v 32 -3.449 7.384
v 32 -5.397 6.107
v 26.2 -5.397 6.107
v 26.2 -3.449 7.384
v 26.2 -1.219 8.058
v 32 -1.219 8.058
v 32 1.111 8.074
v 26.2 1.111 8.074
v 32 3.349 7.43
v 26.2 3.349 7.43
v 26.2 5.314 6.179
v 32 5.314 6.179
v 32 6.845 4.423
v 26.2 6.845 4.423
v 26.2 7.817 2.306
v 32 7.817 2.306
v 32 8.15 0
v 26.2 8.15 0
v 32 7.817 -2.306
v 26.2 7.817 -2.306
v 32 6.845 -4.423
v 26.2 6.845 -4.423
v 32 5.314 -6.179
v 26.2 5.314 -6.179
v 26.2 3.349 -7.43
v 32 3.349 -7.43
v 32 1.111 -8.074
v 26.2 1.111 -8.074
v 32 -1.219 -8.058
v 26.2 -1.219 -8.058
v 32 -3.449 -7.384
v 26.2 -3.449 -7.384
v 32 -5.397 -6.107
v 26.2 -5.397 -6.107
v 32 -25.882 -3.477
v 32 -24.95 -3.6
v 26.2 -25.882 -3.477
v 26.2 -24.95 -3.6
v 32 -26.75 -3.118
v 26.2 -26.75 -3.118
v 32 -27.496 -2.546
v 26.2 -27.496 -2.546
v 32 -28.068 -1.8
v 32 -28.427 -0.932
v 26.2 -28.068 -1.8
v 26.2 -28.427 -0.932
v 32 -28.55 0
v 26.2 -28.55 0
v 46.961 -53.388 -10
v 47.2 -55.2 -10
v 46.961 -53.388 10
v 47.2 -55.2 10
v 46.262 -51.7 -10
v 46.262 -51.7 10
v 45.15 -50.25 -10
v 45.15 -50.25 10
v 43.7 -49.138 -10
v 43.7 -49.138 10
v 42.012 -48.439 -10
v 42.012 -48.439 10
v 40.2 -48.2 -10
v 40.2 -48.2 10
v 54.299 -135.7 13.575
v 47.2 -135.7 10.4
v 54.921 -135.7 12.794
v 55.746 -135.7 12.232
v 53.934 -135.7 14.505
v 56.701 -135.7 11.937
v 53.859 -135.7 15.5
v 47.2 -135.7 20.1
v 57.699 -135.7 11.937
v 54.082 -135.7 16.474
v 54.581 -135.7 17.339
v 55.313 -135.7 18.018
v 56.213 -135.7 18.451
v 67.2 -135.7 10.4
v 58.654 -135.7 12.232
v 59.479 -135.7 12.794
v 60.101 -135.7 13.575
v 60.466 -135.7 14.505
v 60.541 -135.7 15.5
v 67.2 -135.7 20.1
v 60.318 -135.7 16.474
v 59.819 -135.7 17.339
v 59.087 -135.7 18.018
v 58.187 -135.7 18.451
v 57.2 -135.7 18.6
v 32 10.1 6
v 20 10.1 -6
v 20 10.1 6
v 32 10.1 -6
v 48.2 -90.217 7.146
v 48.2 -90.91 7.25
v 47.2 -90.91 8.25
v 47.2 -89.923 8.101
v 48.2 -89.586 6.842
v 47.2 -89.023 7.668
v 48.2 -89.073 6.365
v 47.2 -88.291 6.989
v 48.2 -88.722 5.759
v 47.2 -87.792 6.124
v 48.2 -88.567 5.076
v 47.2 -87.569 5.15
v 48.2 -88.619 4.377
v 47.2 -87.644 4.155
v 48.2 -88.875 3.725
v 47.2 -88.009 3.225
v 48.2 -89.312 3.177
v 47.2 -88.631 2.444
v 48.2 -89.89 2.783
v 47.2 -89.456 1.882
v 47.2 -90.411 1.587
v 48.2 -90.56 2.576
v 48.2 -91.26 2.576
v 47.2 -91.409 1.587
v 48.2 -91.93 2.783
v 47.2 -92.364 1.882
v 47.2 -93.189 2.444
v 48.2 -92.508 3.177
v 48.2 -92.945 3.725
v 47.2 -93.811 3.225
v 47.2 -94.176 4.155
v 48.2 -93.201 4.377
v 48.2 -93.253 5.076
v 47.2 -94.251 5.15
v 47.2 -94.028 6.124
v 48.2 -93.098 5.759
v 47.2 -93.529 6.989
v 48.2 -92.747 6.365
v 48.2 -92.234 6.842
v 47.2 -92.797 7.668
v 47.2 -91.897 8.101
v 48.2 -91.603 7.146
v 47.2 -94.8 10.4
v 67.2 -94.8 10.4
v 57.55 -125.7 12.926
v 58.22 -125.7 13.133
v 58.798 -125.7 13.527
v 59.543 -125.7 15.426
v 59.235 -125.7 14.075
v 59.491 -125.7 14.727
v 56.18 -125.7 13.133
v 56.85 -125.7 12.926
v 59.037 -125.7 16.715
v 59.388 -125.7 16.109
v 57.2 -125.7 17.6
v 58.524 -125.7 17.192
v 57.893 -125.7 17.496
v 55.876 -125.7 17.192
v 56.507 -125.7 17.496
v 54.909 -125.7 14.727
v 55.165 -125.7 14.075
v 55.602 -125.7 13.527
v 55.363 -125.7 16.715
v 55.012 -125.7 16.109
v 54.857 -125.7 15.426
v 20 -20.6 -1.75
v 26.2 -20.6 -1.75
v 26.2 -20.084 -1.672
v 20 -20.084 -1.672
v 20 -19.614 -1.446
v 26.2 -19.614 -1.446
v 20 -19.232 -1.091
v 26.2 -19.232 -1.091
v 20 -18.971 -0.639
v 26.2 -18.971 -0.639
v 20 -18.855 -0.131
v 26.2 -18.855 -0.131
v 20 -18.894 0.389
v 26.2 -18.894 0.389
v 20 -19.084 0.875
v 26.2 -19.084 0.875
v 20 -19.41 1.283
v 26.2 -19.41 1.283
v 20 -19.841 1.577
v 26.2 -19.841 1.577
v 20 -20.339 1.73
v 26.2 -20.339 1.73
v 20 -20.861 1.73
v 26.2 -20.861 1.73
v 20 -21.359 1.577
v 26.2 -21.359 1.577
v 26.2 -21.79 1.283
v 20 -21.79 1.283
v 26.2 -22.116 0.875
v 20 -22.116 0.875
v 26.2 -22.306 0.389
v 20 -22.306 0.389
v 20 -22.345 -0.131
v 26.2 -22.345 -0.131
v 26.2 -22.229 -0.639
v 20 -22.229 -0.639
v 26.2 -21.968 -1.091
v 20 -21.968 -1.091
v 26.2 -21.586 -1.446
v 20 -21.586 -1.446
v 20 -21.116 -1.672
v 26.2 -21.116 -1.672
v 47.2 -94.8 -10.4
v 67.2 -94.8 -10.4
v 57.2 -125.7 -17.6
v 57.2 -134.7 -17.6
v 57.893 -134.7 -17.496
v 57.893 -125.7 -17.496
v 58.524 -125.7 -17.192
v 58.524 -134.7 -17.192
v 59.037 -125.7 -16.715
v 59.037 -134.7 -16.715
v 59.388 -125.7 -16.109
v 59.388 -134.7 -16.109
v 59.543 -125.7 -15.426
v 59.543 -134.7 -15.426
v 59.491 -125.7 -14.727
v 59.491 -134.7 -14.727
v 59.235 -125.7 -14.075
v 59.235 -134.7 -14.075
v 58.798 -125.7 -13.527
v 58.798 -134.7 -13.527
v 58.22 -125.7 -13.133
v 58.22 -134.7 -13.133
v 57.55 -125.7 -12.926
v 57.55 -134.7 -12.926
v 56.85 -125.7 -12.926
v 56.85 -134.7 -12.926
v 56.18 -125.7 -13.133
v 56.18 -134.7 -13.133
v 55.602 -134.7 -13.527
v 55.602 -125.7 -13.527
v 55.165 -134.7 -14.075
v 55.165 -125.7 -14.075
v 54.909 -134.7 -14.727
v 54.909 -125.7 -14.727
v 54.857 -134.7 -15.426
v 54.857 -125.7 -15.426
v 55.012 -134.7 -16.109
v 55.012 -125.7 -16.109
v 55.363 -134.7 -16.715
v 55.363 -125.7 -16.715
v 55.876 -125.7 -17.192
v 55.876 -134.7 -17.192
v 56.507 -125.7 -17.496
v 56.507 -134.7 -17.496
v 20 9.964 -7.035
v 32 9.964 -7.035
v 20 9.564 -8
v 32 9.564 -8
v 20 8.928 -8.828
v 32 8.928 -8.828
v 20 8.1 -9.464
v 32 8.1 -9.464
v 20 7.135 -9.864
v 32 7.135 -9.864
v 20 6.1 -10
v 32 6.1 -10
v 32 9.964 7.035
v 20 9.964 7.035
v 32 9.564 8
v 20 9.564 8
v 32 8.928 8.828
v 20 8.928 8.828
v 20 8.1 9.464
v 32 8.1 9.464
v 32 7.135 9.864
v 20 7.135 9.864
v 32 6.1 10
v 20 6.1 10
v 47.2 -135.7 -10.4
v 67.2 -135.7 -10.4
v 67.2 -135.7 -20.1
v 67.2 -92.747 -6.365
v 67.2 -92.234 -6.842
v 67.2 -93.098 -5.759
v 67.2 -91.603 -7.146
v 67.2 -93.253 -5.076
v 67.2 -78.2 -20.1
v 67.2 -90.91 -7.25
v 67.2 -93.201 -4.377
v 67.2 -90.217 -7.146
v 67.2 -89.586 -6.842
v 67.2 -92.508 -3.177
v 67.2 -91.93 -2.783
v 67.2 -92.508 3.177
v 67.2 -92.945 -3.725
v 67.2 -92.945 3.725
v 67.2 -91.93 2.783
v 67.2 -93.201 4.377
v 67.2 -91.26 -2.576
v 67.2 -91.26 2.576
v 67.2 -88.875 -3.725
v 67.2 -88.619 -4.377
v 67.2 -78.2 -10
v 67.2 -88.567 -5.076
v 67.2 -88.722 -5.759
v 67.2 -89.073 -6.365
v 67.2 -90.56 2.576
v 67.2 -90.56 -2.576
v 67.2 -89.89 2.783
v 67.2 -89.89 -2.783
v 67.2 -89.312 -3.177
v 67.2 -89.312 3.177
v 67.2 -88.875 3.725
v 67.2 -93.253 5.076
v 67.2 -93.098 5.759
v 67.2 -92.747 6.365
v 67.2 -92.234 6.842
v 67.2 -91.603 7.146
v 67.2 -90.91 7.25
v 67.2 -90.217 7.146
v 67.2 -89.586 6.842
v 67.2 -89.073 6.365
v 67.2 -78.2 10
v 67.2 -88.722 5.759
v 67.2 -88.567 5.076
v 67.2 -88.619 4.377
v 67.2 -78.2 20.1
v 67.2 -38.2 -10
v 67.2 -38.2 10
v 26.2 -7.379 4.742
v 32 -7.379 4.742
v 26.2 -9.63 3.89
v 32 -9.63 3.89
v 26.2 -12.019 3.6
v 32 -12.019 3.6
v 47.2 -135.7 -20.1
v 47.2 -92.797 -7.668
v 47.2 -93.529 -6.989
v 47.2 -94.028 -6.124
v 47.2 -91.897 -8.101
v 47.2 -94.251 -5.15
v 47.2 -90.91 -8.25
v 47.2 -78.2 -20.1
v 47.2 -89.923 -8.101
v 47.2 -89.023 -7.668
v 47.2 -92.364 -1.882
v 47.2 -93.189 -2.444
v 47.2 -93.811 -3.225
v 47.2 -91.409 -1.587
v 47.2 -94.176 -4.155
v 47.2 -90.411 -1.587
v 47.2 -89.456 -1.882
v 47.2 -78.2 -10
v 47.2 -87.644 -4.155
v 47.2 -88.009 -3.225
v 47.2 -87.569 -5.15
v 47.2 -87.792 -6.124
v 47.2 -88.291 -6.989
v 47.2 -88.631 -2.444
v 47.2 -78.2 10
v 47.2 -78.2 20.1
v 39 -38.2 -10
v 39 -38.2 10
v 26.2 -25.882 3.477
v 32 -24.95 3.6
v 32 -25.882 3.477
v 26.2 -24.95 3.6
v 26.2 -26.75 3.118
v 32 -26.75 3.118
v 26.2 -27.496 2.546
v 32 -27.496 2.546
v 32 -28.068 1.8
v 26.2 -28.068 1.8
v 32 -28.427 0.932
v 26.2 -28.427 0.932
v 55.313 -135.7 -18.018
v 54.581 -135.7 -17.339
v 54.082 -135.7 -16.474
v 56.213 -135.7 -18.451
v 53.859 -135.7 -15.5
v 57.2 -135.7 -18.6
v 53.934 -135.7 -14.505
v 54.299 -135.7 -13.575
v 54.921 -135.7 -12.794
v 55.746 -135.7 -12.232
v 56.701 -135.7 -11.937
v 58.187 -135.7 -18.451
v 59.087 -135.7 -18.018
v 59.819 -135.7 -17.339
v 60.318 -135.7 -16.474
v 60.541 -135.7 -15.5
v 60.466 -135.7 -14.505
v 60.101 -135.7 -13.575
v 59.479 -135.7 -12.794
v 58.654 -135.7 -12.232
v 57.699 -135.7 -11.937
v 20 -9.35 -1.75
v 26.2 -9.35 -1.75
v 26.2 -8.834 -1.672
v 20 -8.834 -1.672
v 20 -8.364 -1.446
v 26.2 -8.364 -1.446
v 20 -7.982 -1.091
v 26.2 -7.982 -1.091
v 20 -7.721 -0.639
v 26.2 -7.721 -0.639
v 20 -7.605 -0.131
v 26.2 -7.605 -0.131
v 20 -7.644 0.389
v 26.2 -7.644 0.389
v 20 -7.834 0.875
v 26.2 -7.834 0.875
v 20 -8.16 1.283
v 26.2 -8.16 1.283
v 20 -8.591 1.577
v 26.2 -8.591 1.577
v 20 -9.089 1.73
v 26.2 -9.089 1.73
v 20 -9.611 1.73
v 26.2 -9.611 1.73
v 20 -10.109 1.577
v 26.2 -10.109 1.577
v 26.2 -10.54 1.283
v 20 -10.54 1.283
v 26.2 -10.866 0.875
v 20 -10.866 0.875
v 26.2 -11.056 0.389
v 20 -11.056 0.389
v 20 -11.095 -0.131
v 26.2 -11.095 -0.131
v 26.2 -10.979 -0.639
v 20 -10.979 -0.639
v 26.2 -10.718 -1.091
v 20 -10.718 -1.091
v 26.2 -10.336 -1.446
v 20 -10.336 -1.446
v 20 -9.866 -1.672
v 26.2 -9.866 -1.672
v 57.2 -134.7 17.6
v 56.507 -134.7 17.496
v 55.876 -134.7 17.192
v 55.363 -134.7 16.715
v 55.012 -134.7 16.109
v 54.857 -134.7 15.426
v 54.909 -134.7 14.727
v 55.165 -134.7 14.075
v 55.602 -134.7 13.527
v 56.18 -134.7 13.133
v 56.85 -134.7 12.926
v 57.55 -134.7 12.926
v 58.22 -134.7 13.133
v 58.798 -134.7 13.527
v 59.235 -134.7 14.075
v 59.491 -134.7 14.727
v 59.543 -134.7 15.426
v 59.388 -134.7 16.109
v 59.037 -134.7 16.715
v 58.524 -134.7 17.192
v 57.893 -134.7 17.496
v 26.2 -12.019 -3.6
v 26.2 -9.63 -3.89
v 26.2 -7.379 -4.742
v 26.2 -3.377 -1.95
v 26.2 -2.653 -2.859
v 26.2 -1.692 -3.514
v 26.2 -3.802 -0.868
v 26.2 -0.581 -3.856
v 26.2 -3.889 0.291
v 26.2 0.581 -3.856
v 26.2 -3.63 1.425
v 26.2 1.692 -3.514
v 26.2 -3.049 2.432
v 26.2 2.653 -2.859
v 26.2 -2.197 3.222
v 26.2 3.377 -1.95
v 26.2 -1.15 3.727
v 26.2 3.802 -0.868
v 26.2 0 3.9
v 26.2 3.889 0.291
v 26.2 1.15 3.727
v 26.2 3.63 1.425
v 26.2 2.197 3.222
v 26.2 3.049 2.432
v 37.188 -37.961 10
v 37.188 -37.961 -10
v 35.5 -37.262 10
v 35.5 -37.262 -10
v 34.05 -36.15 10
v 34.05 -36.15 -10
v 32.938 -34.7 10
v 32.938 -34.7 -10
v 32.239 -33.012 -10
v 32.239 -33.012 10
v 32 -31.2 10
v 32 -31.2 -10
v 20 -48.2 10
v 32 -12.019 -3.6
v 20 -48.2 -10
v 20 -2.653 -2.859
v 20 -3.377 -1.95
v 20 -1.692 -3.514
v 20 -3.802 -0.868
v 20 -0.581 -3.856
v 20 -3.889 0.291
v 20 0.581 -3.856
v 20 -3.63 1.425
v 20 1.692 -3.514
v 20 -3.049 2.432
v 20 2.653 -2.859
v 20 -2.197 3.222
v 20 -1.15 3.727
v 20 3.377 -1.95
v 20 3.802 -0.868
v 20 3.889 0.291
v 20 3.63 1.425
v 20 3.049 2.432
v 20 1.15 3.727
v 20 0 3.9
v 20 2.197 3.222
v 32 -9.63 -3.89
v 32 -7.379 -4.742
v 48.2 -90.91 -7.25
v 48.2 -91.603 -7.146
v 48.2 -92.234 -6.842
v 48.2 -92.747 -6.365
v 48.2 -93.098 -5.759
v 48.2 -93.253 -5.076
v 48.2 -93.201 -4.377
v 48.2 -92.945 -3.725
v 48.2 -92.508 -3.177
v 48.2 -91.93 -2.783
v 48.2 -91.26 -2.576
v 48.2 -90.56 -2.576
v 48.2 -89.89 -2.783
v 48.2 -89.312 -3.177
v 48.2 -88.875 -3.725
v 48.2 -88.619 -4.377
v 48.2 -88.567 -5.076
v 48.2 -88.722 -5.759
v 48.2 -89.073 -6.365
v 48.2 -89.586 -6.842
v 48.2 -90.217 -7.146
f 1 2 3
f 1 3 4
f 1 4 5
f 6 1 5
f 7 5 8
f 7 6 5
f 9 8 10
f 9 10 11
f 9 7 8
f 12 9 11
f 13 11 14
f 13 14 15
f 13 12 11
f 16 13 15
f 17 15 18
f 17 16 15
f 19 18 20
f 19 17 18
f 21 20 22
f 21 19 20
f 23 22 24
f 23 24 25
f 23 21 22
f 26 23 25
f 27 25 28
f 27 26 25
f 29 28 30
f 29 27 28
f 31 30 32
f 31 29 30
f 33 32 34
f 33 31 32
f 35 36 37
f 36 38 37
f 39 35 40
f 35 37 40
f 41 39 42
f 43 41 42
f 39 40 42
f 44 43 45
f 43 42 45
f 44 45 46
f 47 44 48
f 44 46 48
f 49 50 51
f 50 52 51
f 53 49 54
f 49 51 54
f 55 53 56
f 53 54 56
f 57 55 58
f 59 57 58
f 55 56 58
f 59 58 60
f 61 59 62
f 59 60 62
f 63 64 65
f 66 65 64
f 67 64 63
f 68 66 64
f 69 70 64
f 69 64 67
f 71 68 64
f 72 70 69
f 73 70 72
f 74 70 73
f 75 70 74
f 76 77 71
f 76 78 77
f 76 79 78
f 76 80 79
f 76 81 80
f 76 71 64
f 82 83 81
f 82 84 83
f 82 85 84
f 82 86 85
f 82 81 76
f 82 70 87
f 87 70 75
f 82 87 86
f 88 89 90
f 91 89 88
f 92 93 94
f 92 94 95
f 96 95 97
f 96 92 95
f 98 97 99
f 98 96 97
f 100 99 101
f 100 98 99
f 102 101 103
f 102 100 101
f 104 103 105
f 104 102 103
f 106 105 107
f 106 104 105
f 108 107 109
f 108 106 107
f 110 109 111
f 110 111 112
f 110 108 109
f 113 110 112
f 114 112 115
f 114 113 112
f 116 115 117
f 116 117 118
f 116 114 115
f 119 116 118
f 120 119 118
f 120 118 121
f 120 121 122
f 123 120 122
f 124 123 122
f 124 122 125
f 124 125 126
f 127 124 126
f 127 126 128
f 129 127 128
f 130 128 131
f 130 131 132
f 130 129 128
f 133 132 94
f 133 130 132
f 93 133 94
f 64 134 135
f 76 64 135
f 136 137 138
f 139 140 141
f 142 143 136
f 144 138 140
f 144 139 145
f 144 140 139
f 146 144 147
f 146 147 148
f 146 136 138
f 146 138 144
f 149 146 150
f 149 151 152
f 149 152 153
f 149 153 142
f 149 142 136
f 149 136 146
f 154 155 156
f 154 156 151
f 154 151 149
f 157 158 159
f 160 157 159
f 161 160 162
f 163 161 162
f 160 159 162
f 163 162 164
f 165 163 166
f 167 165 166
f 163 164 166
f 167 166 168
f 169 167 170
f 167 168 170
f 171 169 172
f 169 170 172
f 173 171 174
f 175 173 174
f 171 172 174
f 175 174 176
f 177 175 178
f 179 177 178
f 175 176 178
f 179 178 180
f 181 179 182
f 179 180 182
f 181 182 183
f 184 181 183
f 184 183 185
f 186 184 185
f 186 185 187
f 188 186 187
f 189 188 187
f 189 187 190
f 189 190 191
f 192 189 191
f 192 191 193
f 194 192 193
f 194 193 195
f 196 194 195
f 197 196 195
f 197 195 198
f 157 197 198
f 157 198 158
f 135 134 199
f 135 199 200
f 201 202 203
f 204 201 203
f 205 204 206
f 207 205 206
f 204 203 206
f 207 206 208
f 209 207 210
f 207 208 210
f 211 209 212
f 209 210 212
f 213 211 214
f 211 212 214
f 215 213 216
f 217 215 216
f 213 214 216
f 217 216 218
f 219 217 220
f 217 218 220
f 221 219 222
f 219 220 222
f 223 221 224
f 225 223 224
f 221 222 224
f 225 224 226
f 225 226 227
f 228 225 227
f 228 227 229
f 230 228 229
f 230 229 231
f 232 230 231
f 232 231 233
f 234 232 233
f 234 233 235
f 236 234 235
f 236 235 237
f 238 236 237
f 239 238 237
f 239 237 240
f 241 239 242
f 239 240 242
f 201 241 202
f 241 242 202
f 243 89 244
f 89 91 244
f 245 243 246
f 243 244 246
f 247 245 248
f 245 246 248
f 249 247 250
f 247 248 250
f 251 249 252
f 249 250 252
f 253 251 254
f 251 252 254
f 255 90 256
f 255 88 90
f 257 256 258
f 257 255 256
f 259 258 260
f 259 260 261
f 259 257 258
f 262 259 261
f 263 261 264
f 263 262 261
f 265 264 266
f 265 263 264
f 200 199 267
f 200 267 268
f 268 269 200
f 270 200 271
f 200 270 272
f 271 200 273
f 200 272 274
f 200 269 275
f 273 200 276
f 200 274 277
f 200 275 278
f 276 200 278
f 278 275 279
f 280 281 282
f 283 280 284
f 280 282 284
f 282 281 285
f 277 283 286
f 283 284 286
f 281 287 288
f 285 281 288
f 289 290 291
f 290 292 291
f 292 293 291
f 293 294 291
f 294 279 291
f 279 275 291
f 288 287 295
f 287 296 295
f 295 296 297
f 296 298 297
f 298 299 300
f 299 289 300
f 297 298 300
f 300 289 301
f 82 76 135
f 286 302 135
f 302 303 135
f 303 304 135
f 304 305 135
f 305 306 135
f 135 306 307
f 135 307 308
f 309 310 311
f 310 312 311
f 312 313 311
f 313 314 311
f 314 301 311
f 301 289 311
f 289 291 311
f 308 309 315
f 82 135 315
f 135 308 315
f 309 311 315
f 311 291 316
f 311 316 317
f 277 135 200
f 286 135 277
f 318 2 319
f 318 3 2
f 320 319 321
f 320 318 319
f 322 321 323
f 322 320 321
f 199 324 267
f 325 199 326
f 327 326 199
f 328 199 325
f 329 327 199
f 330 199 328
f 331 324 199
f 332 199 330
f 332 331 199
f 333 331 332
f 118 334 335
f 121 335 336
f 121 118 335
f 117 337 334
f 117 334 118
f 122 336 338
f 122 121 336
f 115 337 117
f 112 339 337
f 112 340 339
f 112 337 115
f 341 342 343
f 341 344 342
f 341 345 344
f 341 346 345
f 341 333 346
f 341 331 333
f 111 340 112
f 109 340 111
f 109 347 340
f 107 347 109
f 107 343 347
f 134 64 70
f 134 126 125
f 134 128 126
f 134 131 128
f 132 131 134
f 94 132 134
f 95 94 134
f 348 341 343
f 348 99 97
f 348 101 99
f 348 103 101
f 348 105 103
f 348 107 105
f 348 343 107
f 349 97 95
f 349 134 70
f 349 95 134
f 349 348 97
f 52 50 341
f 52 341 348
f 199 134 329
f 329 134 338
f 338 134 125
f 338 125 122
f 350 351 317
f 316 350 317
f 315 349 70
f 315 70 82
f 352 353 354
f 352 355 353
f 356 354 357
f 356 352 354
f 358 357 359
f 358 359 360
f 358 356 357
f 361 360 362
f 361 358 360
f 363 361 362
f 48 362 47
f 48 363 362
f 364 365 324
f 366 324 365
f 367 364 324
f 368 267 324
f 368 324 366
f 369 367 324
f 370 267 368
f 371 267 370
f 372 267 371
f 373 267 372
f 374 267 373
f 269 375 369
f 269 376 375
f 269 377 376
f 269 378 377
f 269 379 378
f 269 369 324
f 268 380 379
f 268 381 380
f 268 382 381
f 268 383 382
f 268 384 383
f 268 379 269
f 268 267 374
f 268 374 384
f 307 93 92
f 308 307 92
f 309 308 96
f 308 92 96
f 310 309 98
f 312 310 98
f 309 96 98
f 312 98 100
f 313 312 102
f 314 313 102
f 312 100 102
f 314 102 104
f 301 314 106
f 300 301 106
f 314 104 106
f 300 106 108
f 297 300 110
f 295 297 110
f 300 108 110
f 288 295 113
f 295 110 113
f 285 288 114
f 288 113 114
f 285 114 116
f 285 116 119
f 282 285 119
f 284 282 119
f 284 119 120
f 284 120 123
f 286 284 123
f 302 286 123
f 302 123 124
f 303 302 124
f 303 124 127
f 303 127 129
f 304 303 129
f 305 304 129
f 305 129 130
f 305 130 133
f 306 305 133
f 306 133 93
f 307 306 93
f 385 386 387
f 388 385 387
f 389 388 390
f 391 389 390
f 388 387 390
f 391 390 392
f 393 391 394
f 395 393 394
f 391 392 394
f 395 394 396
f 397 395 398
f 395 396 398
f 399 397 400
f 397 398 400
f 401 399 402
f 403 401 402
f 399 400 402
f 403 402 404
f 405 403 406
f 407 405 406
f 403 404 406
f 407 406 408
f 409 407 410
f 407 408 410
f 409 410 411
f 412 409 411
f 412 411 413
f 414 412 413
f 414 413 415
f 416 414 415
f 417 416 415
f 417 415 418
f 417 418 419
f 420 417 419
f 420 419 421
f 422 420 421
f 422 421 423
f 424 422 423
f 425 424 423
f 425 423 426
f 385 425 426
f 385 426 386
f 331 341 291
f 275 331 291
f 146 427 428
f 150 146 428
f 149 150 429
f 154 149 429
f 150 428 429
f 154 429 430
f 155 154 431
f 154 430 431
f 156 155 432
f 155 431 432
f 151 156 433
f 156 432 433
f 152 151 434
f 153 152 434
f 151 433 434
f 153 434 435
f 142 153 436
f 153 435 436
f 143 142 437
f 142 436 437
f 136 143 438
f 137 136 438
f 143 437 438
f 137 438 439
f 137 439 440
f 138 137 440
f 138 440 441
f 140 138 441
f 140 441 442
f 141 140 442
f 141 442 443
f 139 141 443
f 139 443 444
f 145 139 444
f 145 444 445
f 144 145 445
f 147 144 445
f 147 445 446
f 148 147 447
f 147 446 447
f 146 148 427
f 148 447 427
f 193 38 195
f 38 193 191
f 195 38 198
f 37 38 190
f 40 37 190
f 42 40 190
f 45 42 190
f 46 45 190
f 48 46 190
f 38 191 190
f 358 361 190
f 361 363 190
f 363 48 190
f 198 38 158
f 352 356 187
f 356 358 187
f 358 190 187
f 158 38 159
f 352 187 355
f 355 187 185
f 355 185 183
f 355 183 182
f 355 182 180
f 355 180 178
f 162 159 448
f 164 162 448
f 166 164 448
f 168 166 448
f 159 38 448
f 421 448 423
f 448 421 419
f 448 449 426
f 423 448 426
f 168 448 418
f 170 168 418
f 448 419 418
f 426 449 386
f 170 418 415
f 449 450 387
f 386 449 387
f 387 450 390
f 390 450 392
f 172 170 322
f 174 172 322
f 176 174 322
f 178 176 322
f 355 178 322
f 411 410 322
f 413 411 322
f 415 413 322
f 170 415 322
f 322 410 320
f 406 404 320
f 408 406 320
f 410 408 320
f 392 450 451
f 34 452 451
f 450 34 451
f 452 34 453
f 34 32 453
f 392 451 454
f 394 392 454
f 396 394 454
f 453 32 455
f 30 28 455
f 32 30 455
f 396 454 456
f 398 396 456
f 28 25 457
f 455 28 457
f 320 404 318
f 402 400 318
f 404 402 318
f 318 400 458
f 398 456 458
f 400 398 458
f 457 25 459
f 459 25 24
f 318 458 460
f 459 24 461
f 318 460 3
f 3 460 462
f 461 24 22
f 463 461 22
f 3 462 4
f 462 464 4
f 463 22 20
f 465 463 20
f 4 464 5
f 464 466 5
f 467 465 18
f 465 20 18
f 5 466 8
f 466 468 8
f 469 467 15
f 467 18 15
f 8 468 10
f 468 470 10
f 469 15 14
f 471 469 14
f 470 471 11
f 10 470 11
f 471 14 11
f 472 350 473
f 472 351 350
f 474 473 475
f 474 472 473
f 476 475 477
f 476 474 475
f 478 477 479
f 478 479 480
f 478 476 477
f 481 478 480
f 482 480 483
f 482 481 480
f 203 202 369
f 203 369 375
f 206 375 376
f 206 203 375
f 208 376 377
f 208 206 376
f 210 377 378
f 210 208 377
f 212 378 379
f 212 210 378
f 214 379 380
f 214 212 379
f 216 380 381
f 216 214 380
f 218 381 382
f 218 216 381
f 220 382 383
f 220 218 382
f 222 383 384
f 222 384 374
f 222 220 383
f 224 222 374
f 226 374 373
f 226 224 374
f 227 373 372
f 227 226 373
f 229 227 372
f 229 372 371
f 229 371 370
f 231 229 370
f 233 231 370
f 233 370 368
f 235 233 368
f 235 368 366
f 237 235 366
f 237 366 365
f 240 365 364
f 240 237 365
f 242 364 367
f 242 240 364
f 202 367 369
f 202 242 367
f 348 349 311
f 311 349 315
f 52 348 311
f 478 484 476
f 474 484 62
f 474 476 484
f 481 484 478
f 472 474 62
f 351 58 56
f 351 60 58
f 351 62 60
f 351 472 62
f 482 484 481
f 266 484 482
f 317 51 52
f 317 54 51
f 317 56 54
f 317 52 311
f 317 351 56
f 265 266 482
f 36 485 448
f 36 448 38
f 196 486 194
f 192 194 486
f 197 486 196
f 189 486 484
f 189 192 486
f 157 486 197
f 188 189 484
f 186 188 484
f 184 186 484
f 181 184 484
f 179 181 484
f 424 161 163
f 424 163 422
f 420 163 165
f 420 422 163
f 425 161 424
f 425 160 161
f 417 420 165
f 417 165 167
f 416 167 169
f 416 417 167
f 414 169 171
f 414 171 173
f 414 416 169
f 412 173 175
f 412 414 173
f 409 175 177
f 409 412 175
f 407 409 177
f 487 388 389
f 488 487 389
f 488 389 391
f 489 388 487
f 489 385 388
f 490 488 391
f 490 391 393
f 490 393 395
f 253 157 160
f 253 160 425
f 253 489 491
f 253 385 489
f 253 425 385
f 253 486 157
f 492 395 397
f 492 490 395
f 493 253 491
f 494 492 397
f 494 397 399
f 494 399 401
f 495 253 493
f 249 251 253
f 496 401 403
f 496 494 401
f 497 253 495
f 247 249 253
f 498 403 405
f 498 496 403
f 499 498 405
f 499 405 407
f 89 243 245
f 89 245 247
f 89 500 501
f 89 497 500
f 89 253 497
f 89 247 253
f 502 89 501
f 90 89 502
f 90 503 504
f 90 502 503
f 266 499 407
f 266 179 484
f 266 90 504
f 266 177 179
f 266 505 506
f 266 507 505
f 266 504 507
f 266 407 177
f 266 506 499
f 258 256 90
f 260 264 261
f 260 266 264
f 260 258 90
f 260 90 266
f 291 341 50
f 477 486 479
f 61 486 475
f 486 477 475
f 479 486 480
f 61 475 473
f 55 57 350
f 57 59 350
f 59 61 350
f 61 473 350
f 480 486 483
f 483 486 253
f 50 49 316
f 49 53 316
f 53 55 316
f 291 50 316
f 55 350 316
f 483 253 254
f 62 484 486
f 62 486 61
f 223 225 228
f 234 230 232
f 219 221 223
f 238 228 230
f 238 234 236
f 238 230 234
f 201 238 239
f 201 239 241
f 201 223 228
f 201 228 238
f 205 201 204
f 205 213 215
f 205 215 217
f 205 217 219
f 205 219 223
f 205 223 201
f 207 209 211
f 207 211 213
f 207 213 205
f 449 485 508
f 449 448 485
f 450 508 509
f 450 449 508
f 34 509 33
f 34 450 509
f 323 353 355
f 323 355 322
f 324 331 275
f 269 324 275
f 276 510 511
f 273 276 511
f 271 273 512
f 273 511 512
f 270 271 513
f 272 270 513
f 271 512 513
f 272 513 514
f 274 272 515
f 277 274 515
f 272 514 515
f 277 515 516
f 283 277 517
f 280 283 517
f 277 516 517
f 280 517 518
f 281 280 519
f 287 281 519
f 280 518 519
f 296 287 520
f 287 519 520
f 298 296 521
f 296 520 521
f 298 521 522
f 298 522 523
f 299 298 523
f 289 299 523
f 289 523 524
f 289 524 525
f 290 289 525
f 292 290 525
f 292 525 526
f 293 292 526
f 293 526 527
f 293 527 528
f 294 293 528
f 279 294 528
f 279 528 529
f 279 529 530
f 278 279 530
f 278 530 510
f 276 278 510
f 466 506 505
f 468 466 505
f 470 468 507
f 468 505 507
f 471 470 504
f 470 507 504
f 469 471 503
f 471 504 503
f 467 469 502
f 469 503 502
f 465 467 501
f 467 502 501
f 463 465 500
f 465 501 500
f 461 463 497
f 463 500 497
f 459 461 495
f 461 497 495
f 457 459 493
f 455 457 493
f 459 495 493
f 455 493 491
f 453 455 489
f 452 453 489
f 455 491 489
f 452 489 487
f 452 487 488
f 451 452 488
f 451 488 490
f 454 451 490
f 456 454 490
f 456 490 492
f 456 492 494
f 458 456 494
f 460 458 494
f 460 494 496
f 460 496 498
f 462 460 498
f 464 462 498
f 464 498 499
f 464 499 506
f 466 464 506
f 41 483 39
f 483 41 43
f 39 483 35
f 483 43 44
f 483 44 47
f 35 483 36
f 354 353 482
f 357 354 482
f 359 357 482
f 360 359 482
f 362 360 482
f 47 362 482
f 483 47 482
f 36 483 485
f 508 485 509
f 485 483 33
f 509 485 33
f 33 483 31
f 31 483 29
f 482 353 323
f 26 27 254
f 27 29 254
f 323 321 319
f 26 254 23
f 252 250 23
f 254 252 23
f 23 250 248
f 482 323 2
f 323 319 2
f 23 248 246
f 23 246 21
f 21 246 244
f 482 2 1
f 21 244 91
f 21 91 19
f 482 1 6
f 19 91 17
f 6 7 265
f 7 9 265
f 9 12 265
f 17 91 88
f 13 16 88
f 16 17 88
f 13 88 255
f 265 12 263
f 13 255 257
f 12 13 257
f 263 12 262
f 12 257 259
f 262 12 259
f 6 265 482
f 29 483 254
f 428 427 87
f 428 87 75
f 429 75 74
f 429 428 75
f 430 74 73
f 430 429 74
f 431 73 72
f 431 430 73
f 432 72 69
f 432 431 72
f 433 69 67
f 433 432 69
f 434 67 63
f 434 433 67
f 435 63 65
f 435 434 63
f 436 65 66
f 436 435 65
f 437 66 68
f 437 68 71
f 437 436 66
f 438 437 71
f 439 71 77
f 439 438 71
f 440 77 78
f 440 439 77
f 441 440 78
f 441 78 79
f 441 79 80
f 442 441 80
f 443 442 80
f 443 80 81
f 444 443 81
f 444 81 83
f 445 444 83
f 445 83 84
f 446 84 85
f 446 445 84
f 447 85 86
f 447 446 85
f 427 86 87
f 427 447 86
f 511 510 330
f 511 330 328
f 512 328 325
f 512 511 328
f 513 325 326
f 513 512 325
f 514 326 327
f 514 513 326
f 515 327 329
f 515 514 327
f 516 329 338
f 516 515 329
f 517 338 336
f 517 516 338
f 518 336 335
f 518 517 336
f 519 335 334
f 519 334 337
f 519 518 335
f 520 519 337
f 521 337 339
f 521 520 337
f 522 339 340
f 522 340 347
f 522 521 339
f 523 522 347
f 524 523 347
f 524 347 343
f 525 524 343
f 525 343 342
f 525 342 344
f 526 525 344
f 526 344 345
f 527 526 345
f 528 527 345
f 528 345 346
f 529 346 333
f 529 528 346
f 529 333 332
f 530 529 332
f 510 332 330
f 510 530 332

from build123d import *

# Parameters (mm, degrees)
SKETCH1_W            = 20
SKETCH1_H            = 20
BOSS_EXTRUDE1_DEPTH  = 20
SKETCH2_W            = 45
SKETCH2_H            = 70
BOSS_EXTRUDE2_DEPTH  = 12
CUT_EXTRUDE1_DEPTH   = 5.8
FILLET1_R            = 3.6
FILLET2_R            = 10
SKETCH5_R            = 3.9
CUT_EXTRUDE2_DEPTH   = 53.490475326
CUT_EXTRUDE3_REACH   = 51.17
SKETCH6_R            = 1.75
SKETCH7_W            = 12
SKETCH7_H            = 45
CUT_EXTRUDE4_DEPTH   = 4.8
SKETCH9_W            = 12
SKETCH9_H            = 45
CUT_EXTRUDE5_DEPTH   = 23.8
SKETCH10_W           = 12.5
SKETCH10_H           = 41.4
CUT_EXTRUDE6_DEPTH   = 23.8
SKETCH11_W           = 20
SKETCH11_H           = 1.2
CUT_EXTRUDE7_DEPTH   = 23.8
BOSS_EXTRUDE3_START  = 20
SKETCH12_W           = 20
SKETCH12_H           = 20
SKETCH12_R           = 3.9
BOSS_EXTRUDE3_DEPTH  = 20
SKETCH13_W           = 20.2
SKETCH13_H           = 20.2
SKETCH13_R           = 3.9
BOSS_EXTRUDE4_DEPTH  = 40
SKETCH14_W           = 12
SKETCH14_H           = 20
BOSS_EXTRUDE5_DEPTH  = 0.1
SKETCH17_R           = 4.83091966
BOSS_EXTRUDE8_DEPTH  = 39
SKETCH18_W           = 20.2
SKETCH18_H           = 20.2
CUT_EXTRUDE8_DEPTH   = 40
FILLET4_R            = 4
SKETCH20_W           = 12
SKETCH20_H           = 20
BOSS_EXTRUDE9_DEPTH  = 8
SKETCH21_W           = 47.2
SKETCH21_H           = 20
BOSS_EXTRUDE11_DEPTH = 10
SKETCH23_W           = 20
SKETCH23_H           = 20
BOSS_EXTRUDE12_DEPTH = 30
SKETCH25_W           = 20
SKETCH25_H           = 40.2
BOSS_EXTRUDE13_DEPTH = 57.5
SKETCH26_W           = 20
SKETCH26_H           = 20.8
CUT_EXTRUDE9_DEPTH   = 40.9
SKETCH27_R           = 2.35
CUT_EXTRUDE10_DEPTH  = 10
SKETCH28_R           = 2.35
CUT_EXTRUDE11_DEPTH  = 140.85113514
CHAMFER1_SIZE        = 1
FILLET5_R            = 7


with BuildPart() as part:
    # Sketch1 → Boss-Extrude1 (new body)
    with BuildSketch(Plane(origin=(0, 0, 0), x_dir=(0, 0, -1), z_dir=(1, 0, 0))):
        Rectangle(SKETCH1_W, SKETCH1_H)
    extrude(amount=BOSS_EXTRUDE1_DEPTH)

    # Sketch2 → Boss-Extrude2 (add)
    with BuildSketch(Plane(origin=(20, 0, 0), x_dir=(0, 0, -1), z_dir=(1, 0, 0))):
        Rectangle(SKETCH2_W, SKETCH2_H)
    extrude(amount=BOSS_EXTRUDE2_DEPTH)

    # Sketch4 → Cut-Extrude1 (cut)
    with BuildSketch(Plane(origin=(32, 0, 0), x_dir=(0, 0, -1), z_dir=(1, 0, 0))):
        with BuildLine():
            Line((3.6, -28.55), (-3.6, -28.55))
            Line((-3.6, -28.55), (-3.6, -7.311805523))
            ThreePointArc((-3.6, -7.311805523), (0, 8.15), (3.6, -7.311805523))
            Line((3.6, -7.311805523), (3.6, -28.55))
        make_face()
    extrude(amount=-CUT_EXTRUDE1_DEPTH, mode=Mode.SUBTRACT)

    # Fillet1
    fillet1_edges = [part.edges().sort_by_distance(p)[0] for p in [
        (29.1, -28.55, 3.6),
        (29.1, -28.55, -3.6),
    ]]
    fillet(fillet1_edges, radius=FILLET1_R - 0.0001)  # a hair under: the kernel refuses the full size

    # Fillet2
    fillet2_edges = [part.edges().sort_by_distance(p)[0] for p in [
        (29.1, -7.311805523, 3.6),
        (29.1, -7.311805523, -3.6),
    ]]
    fillet(fillet2_edges, radius=FILLET2_R)

    # Sketch5 → Cut-Extrude2 (cut, through all)
    with BuildSketch(Plane.ZY):
        Circle(SKETCH5_R)
    extrude(amount=-CUT_EXTRUDE2_DEPTH, mode=Mode.SUBTRACT)

    # Sketch6 → Cut-Extrude3 (cut, up to next)
    with BuildSketch(Plane(origin=(26.2, 0, 0), x_dir=(0, 0, -1), z_dir=(1, 0, 0)), mode=Mode.PRIVATE) as cut_extrude3_sk1:
        with Locations((0, -20.6)):
            Circle(SKETCH6_R)
    cut_extrude3_tool1 = extrude(cut_extrude3_sk1.sketch, amount=-CUT_EXTRUDE3_REACH, mode=Mode.PRIVATE) & part.part
    # Sketch6 → Cut-Extrude3 (cut, up to next)
    with BuildSketch(Plane(origin=(26.2, 0, 0), x_dir=(0, 0, -1), z_dir=(1, 0, 0)), mode=Mode.PRIVATE) as cut_extrude3_sk2:
        with Locations((0, -9.35)):
            Circle(SKETCH6_R)
    cut_extrude3_tool2 = extrude(cut_extrude3_sk2.sketch, amount=-CUT_EXTRUDE3_REACH, mode=Mode.PRIVATE) & part.part
    add(cut_extrude3_tool1.solids().sort_by_distance((26.2, -20.6, 0))[0], mode=Mode.SUBTRACT)
    add(cut_extrude3_tool2.solids().sort_by_distance((26.2, -9.35, 0))[0], mode=Mode.SUBTRACT)

    # Sketch7 → Cut-Extrude4 (cut)
    with BuildSketch(Plane.XZ.offset(35)):
        with Locations((26, 0)):
            Rectangle(SKETCH7_W, SKETCH7_H)
    extrude(amount=-CUT_EXTRUDE4_DEPTH, mode=Mode.SUBTRACT)

    # Sketch9 → Cut-Extrude5 (cut)
    with BuildSketch(Plane(origin=(0, 35, 0), x_dir=(1, 0, 0), z_dir=(0, 1, 0))):
        with Locations((26, 0)):
            Rectangle(SKETCH9_W, SKETCH9_H)
    extrude(amount=-CUT_EXTRUDE5_DEPTH, mode=Mode.SUBTRACT)

    # Sketch10 → Cut-Extrude6 (cut)
    with BuildSketch(Plane.ZY.offset(-20)):
        with Locations((-16.25, -9.5)):
            Rectangle(SKETCH10_W, SKETCH10_H)
        with Locations((16.25, -9.5)):
            Rectangle(SKETCH10_W, SKETCH10_H)
    extrude(amount=-CUT_EXTRUDE6_DEPTH, mode=Mode.SUBTRACT)

    # Sketch11 → Cut-Extrude7 (cut)
    with BuildSketch(Plane.ZY.offset(-20)):
        with Locations((0, 10.6)):
            Rectangle(SKETCH11_W, SKETCH11_H)
    extrude(amount=-CUT_EXTRUDE7_DEPTH, mode=Mode.SUBTRACT)

    # Sketch12 → Boss-Extrude3 (add)
    with BuildSketch(Plane.ZY.offset(BOSS_EXTRUDE3_START)):
        Rectangle(SKETCH12_W, SKETCH12_H)
        Circle(SKETCH12_R, mode=Mode.SUBTRACT)
    extrude(amount=-BOSS_EXTRUDE3_DEPTH)

    # Sketch13 → Boss-Extrude4 (add)
    with BuildSketch(Plane.ZY.offset(20)):
        Rectangle(SKETCH13_W, SKETCH13_H)
        Circle(SKETCH13_R, mode=Mode.SUBTRACT)
    extrude(amount=-BOSS_EXTRUDE4_DEPTH)

    # Sketch14 → Boss-Extrude5 (add)
    with BuildSketch(Plane(origin=(0, 10, 0), x_dir=(1, 0, 0), z_dir=(0, 1, 0))):
        with Locations((26, 0)):
            Rectangle(SKETCH14_W, SKETCH14_H)
    extrude(amount=BOSS_EXTRUDE5_DEPTH)

    # Sketch17 → Boss-Extrude8 (add)
    with BuildSketch(Plane.ZY.offset(20)):
        Circle(SKETCH17_R)
    extrude(amount=-BOSS_EXTRUDE8_DEPTH)

    # Sketch18 → Cut-Extrude8 (cut)
    with BuildSketch(Plane.ZY.offset(20)):
        Rectangle(SKETCH18_W, SKETCH18_H)
    extrude(amount=-CUT_EXTRUDE8_DEPTH, mode=Mode.SUBTRACT)

    # Fillet4
    fillet4_edges = [part.edges().sort_by_distance(p)[0] for p in [
        (26, 10.1, -10),
        (26, 10.1, 10),
    ]]
    fillet(fillet4_edges, radius=FILLET4_R)

    # Sketch20 → Boss-Extrude9 (add)
    with BuildSketch(Plane.XZ.offset(30.2)):
        with Locations((26, 0)):
            Rectangle(SKETCH20_W, SKETCH20_H)
    extrude(amount=BOSS_EXTRUDE9_DEPTH)

    # Sketch21 → Boss-Extrude11 (add)
    with BuildSketch(Plane.XZ.offset(38.2)):
        with Locations((43.6, 0)):
            Rectangle(SKETCH21_W, SKETCH21_H)
    extrude(amount=BOSS_EXTRUDE11_DEPTH)

    # Sketch23 → Boss-Extrude12 (add)
    with BuildSketch(Plane.XZ.offset(48.2)):
        with Locations((57.2, 0)):
            Rectangle(SKETCH23_W, SKETCH23_H)
    extrude(amount=BOSS_EXTRUDE12_DEPTH)

    # Sketch25 → Boss-Extrude13 (add)
    with BuildSketch(Plane.XZ.offset(78.2)):
        with Locations((57.2, 0)):
            Rectangle(SKETCH25_W, SKETCH25_H)
    extrude(amount=BOSS_EXTRUDE13_DEPTH)

    # Sketch26 → Cut-Extrude9 (cut)
    with BuildSketch(Plane.XZ.offset(135.7)):
        with Locations((57.2, 0)):
            Rectangle(SKETCH26_W, SKETCH26_H)
    extrude(amount=-CUT_EXTRUDE9_DEPTH, mode=Mode.SUBTRACT)

    # Sketch27 → Cut-Extrude10 (cut)
    with BuildSketch(Plane(origin=(0, -135.7, 0), x_dir=(-1, 0, 0), z_dir=(0, -1, 0))):
        with Locations(Location((-57.2, 15.25, 0), (0, 0, 90))):
            Circle(SKETCH27_R)
        with Locations(Location((-57.2, -15.25, 0), (0, 0, 270))):
            Circle(SKETCH27_R)
    extrude(amount=-CUT_EXTRUDE10_DEPTH, mode=Mode.SUBTRACT)

    # Sketch28 → Cut-Extrude11 (cut, through all)
    with BuildSketch(Plane.ZY.offset(-47.2)):
        with Locations((4.9, -90.91)):
            Circle(SKETCH28_R)
        with Locations(Location((-4.9, -90.91, 0), (0, 0, 180))):
            Circle(SKETCH28_R)
    extrude(amount=-CUT_EXTRUDE11_DEPTH, mode=Mode.SUBTRACT)

    # Chamfer1
    chamfer1_edges = [part.edges().sort_by_distance(p)[0] for p in [
        (57.2, -135.7, -12.9),
        (57.2, -135.7, 12.9),
        (47.2, -90.91, 2.55),
        (47.2, -90.91, -2.55),
    ]]
    chamfer(chamfer1_edges, length=CHAMFER1_SIZE)

    # Fillet5
    fillet5_edges = [part.edges().sort_by_distance(p)[0] for p in [
        (32, -38.2, 0),
        (47.2, -48.2, 0),
    ]]
    fillet(fillet5_edges, radius=FILLET5_R)


solid = part.part
